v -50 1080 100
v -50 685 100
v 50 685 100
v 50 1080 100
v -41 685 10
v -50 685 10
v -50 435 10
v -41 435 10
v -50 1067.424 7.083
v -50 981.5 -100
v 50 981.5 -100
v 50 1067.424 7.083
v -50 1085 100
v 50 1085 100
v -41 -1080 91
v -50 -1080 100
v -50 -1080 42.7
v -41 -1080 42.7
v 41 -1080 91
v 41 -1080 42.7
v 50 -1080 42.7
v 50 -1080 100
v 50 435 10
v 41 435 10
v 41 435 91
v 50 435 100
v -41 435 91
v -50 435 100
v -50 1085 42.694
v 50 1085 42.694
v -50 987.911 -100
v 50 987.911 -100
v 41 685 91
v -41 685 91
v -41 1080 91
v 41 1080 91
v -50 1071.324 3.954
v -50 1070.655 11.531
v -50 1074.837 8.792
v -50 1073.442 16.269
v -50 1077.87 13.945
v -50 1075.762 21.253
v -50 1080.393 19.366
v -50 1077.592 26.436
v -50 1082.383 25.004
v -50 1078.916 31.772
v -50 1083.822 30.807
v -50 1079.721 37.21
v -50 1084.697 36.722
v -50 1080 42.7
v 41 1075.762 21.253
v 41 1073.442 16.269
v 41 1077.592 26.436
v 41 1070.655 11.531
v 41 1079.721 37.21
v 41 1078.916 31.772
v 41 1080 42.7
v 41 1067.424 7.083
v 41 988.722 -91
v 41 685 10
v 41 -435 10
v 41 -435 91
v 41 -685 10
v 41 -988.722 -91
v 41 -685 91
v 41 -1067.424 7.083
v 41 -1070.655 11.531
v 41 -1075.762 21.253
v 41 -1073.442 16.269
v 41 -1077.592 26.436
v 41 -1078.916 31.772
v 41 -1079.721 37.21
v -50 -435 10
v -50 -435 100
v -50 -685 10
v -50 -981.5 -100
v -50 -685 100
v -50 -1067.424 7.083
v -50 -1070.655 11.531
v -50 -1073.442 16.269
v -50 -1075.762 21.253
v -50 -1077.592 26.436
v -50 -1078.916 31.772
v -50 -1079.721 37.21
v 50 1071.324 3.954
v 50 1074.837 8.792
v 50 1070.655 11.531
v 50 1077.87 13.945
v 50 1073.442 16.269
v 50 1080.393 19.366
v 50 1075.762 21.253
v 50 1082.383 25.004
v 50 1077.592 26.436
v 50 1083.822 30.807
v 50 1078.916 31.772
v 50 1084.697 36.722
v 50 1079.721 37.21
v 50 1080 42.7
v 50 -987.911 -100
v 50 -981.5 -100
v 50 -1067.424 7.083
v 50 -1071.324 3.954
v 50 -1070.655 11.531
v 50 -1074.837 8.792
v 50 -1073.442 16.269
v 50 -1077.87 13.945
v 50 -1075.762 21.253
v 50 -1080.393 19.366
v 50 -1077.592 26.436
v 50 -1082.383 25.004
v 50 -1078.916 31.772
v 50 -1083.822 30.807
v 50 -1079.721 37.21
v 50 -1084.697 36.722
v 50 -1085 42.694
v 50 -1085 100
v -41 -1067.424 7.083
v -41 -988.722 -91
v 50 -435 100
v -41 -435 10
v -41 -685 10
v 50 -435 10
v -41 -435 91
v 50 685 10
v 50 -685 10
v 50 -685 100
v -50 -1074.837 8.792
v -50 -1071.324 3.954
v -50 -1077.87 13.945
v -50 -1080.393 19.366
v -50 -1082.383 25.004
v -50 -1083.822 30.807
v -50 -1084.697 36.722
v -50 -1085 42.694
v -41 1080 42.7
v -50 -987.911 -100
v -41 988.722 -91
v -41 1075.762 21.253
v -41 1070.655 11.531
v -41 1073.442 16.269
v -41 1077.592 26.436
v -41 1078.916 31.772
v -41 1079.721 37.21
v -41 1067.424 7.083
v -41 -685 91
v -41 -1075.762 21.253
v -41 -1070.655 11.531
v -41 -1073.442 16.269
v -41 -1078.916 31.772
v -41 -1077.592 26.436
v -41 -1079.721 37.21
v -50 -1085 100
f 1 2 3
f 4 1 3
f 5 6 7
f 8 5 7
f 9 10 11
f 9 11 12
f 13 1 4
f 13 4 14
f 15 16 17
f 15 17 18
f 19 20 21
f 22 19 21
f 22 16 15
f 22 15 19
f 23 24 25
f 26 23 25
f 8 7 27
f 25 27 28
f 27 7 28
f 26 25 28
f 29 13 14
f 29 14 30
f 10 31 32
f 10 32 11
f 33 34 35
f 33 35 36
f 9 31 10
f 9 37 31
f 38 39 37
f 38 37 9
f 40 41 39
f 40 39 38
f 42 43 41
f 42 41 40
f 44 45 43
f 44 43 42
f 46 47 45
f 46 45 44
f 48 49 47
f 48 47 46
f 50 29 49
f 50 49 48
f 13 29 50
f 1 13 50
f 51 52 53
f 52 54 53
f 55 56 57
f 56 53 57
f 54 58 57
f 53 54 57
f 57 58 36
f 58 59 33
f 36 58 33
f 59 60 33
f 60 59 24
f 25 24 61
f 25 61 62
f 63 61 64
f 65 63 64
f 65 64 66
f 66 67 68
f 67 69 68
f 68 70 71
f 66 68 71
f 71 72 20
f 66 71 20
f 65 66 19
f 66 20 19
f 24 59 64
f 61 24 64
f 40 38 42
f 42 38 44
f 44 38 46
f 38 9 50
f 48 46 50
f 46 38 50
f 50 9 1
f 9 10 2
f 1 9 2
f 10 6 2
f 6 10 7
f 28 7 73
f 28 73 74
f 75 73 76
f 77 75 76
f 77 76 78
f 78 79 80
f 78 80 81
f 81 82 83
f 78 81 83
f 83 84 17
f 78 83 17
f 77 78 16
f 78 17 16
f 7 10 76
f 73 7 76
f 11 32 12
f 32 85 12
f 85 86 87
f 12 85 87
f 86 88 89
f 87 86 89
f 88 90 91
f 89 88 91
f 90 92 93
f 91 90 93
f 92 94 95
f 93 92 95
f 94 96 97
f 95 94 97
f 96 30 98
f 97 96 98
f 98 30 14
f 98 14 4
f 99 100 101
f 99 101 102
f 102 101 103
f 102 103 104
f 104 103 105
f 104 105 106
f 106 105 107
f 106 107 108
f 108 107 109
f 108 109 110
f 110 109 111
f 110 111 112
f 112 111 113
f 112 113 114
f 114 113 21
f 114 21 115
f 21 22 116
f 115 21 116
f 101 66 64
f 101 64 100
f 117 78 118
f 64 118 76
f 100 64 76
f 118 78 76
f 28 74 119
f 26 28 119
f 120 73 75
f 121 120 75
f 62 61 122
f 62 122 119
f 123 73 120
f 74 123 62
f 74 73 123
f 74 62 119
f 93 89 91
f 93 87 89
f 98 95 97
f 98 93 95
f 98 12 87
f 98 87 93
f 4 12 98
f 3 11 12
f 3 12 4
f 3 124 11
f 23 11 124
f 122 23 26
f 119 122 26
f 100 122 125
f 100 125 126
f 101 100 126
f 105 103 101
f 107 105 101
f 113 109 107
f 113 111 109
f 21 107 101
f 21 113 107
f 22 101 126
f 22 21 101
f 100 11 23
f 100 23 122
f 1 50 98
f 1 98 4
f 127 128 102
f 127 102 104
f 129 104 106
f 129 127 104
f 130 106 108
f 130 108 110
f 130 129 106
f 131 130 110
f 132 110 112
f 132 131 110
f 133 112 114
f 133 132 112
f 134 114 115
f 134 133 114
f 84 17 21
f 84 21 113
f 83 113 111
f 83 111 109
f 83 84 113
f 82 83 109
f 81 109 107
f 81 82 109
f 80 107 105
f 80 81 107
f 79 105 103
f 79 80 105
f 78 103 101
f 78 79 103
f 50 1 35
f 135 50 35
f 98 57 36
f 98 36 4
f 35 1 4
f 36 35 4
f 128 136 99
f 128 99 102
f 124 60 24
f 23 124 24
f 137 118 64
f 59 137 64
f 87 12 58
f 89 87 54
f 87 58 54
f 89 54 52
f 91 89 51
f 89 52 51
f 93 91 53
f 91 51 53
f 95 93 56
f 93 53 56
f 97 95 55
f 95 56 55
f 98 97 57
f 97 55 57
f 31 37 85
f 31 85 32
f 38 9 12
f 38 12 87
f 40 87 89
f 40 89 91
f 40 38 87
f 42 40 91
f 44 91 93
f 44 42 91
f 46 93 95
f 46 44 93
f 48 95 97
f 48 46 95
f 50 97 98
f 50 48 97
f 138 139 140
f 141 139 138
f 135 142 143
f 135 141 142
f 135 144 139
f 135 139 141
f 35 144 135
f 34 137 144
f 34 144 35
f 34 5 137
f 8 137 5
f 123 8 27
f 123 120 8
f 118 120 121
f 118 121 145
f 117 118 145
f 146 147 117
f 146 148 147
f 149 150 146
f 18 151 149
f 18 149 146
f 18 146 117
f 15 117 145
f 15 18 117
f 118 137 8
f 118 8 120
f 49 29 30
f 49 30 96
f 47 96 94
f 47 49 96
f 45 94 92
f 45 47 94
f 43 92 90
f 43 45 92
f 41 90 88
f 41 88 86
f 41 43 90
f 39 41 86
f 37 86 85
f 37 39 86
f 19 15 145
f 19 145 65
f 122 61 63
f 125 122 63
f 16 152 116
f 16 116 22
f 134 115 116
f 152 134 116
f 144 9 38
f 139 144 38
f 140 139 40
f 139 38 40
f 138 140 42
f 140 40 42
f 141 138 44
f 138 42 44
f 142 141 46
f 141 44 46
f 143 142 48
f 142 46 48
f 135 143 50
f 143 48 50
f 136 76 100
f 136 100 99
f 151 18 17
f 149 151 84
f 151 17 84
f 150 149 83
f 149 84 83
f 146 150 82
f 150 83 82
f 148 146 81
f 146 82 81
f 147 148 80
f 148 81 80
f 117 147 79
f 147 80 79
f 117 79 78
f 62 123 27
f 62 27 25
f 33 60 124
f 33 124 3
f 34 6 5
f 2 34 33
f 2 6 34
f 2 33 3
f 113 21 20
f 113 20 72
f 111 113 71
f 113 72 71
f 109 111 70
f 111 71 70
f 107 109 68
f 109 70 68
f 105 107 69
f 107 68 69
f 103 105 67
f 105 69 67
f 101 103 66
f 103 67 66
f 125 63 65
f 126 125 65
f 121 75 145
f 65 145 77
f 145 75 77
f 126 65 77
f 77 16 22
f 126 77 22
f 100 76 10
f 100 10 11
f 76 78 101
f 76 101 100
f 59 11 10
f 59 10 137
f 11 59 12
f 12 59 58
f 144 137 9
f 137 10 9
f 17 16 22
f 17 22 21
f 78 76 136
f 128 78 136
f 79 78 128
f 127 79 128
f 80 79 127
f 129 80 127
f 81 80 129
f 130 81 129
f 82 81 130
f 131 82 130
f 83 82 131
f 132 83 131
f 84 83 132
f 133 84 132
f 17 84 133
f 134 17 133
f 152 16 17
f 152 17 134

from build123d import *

# Parameters (mm, degrees)
F0_W     = 100
F0_H     = 200
F0_W_2   = 82
F0_H_2   = 182
F1_DEPTH = 1080
F2_W     = 250
F2_H     = 223.694717288
F3_DEPTH = 100.001
F5_DEPTH = 100.001
F6_DEPTH = 100


with BuildPart() as f1:
    # F0 (on Front) → F1 (new body, symmetric)
    with BuildSketch(Plane.XZ):
        Rectangle(F0_W, F0_H)
        Rectangle(F0_W_2, F0_H_2, mode=Mode.SUBTRACT)
    extrude(amount=F1_DEPTH, both=True)

    # F2 (on face) → F3 (cut, through all)
    with BuildSketch(Plane(origin=(-50, 0, 0), x_dir=(0, -1, 0), z_dir=(-1, 0, 0))):
        with BuildLine():
            Line((-981.5, -208.9942991734), (-981.5, -100))
            Line((-981.5, -100), (-1067.4243940422, 7.0831383014))
            ThreePointArc((-1067.4243940422, 7.0831383014), (-1076.789487617, 23.964114381), (-1080, 43))
            Line((-1080, 43), (-1186.2337589264, 43))
            Line((-1186.2337589264, 43), (-1186.2337589264, -208.9942991734))
            Line((-1186.2337589264, -208.9942991734), (-981.5, -208.9942991734))
        make_face()
        with Locations((-560, 121.847358644)):
            Rectangle(F2_W, F2_H)
        with BuildLine():
            Line((981.5, -100), (981.5, -208.9942991734))
            Line((981.5, -208.9942991734), (1186.2337589264, -208.9942991734))
            Line((1186.2337589264, -208.9942991734), (1186.2337589264, 43))
            Line((1186.2337589264, 43), (1080, 43))
            ThreePointArc((1080, 43), (1076.789487617, 23.964114381), (1067.4243940422, 7.0831383014))
            Line((1067.4243940422, 7.0831383014), (981.5, -100))
        make_face()
        with Locations((560, 121.847358644)):
            Rectangle(F2_W, F2_H)
    extrude(amount=-F3_DEPTH, mode=Mode.SUBTRACT)

    # F4 (on face) → F5 (cut, through all)
    with BuildSketch(Plane(origin=(-50, 0, 0), x_dir=(0, -1, 0), z_dir=(-1, 0, 0))):
        with BuildLine():
            Line((-987.9106532549, -100), (-981.5, -100))
            Line((-981.5, -100), (-1067.4243940422, 7.0831383014))
            ThreePointArc((-1067.4243940422, 7.0831383014), (-1076.7397327432, 23.8226064615), (-1080, 42.7))
            Line((-1080, 42.7), (-1080, 100))
            Line((-1080, 100), (-1085, 100))
            Line((-1085, 100), (-1085, 42.6935758952))
            ThreePointArc((-1085, 42.6935758952), (-1081.4555938979, 22.1610818945), (-1071.3241526169, 3.9539398323))
            Line((-1071.3241526169, 3.9539398323), (-987.9106532549, -100))
        make_face()
        with BuildLine():
            Line((1085, 42.6935758952), (1085, 100))
            Line((1085, 100), (1080, 100))
            Line((1080, 100), (1080, 42.7))
            ThreePointArc((1080, 42.7), (1076.7397327432, 23.8226064615), (1067.4243940422, 7.0831383014))
            Line((1067.4243940422, 7.0831383014), (981.5, -100))
            Line((981.5, -100), (987.9106532549, -100))
            Line((987.9106532549, -100), (1071.3241526169, 3.9539398323))
            ThreePointArc((1071.3241526169, 3.9539398323), (1081.4555938979, 22.1610818945), (1085, 42.6935758952))
        make_face()
    extrude(amount=-F5_DEPTH, mode=Mode.SUBTRACT)


with BuildPart() as f6:
    # F4 (on face) → F6 (new body, through all)
    with BuildSketch(Plane(origin=(-50, 0, 0), x_dir=(0, -1, 0), z_dir=(-1, 0, 0))):
        with BuildLine():
            Line((-987.9106532549, -100), (-981.5, -100))
            Line((-981.5, -100), (-1067.4243940422, 7.0831383014))
            ThreePointArc((-1067.4243940422, 7.0831383014), (-1076.7397327432, 23.8226064615), (-1080, 42.7))
            Line((-1080, 42.7), (-1080, 100))
            Line((-1080, 100), (-1085, 100))
            Line((-1085, 100), (-1085, 42.6935758952))
            ThreePointArc((-1085, 42.6935758952), (-1081.4555938979, 22.1610818945), (-1071.3241526169, 3.9539398323))
            Line((-1071.3241526169, 3.9539398323), (-987.9106532549, -100))
        make_face()
    extrude(amount=-F6_DEPTH)


with BuildPart() as f6b:
    # F4 (on face) → F6, piece 2 (new body, through all)
    with BuildSketch(Plane(origin=(-50, 0, 0), x_dir=(0, -1, 0), z_dir=(-1, 0, 0))):
        with BuildLine():
            Line((1085, 42.6935758952), (1085, 100))
            Line((1085, 100), (1080, 100))
            Line((1080, 100), (1080, 42.7))
            ThreePointArc((1080, 42.7), (1076.7397327432, 23.8226064615), (1067.4243940422, 7.0831383014))
            Line((1067.4243940422, 7.0831383014), (981.5, -100))
            Line((981.5, -100), (987.9106532549, -100))
            Line((987.9106532549, -100), (1071.3241526169, 3.9539398323))
            ThreePointArc((1071.3241526169, 3.9539398323), (1081.4555938979, 22.1610818945), (1085, 42.6935758952))
        make_face()
    extrude(amount=-F6_DEPTH)


solid = Compound([f1.part, f6.part, f6b.part])
